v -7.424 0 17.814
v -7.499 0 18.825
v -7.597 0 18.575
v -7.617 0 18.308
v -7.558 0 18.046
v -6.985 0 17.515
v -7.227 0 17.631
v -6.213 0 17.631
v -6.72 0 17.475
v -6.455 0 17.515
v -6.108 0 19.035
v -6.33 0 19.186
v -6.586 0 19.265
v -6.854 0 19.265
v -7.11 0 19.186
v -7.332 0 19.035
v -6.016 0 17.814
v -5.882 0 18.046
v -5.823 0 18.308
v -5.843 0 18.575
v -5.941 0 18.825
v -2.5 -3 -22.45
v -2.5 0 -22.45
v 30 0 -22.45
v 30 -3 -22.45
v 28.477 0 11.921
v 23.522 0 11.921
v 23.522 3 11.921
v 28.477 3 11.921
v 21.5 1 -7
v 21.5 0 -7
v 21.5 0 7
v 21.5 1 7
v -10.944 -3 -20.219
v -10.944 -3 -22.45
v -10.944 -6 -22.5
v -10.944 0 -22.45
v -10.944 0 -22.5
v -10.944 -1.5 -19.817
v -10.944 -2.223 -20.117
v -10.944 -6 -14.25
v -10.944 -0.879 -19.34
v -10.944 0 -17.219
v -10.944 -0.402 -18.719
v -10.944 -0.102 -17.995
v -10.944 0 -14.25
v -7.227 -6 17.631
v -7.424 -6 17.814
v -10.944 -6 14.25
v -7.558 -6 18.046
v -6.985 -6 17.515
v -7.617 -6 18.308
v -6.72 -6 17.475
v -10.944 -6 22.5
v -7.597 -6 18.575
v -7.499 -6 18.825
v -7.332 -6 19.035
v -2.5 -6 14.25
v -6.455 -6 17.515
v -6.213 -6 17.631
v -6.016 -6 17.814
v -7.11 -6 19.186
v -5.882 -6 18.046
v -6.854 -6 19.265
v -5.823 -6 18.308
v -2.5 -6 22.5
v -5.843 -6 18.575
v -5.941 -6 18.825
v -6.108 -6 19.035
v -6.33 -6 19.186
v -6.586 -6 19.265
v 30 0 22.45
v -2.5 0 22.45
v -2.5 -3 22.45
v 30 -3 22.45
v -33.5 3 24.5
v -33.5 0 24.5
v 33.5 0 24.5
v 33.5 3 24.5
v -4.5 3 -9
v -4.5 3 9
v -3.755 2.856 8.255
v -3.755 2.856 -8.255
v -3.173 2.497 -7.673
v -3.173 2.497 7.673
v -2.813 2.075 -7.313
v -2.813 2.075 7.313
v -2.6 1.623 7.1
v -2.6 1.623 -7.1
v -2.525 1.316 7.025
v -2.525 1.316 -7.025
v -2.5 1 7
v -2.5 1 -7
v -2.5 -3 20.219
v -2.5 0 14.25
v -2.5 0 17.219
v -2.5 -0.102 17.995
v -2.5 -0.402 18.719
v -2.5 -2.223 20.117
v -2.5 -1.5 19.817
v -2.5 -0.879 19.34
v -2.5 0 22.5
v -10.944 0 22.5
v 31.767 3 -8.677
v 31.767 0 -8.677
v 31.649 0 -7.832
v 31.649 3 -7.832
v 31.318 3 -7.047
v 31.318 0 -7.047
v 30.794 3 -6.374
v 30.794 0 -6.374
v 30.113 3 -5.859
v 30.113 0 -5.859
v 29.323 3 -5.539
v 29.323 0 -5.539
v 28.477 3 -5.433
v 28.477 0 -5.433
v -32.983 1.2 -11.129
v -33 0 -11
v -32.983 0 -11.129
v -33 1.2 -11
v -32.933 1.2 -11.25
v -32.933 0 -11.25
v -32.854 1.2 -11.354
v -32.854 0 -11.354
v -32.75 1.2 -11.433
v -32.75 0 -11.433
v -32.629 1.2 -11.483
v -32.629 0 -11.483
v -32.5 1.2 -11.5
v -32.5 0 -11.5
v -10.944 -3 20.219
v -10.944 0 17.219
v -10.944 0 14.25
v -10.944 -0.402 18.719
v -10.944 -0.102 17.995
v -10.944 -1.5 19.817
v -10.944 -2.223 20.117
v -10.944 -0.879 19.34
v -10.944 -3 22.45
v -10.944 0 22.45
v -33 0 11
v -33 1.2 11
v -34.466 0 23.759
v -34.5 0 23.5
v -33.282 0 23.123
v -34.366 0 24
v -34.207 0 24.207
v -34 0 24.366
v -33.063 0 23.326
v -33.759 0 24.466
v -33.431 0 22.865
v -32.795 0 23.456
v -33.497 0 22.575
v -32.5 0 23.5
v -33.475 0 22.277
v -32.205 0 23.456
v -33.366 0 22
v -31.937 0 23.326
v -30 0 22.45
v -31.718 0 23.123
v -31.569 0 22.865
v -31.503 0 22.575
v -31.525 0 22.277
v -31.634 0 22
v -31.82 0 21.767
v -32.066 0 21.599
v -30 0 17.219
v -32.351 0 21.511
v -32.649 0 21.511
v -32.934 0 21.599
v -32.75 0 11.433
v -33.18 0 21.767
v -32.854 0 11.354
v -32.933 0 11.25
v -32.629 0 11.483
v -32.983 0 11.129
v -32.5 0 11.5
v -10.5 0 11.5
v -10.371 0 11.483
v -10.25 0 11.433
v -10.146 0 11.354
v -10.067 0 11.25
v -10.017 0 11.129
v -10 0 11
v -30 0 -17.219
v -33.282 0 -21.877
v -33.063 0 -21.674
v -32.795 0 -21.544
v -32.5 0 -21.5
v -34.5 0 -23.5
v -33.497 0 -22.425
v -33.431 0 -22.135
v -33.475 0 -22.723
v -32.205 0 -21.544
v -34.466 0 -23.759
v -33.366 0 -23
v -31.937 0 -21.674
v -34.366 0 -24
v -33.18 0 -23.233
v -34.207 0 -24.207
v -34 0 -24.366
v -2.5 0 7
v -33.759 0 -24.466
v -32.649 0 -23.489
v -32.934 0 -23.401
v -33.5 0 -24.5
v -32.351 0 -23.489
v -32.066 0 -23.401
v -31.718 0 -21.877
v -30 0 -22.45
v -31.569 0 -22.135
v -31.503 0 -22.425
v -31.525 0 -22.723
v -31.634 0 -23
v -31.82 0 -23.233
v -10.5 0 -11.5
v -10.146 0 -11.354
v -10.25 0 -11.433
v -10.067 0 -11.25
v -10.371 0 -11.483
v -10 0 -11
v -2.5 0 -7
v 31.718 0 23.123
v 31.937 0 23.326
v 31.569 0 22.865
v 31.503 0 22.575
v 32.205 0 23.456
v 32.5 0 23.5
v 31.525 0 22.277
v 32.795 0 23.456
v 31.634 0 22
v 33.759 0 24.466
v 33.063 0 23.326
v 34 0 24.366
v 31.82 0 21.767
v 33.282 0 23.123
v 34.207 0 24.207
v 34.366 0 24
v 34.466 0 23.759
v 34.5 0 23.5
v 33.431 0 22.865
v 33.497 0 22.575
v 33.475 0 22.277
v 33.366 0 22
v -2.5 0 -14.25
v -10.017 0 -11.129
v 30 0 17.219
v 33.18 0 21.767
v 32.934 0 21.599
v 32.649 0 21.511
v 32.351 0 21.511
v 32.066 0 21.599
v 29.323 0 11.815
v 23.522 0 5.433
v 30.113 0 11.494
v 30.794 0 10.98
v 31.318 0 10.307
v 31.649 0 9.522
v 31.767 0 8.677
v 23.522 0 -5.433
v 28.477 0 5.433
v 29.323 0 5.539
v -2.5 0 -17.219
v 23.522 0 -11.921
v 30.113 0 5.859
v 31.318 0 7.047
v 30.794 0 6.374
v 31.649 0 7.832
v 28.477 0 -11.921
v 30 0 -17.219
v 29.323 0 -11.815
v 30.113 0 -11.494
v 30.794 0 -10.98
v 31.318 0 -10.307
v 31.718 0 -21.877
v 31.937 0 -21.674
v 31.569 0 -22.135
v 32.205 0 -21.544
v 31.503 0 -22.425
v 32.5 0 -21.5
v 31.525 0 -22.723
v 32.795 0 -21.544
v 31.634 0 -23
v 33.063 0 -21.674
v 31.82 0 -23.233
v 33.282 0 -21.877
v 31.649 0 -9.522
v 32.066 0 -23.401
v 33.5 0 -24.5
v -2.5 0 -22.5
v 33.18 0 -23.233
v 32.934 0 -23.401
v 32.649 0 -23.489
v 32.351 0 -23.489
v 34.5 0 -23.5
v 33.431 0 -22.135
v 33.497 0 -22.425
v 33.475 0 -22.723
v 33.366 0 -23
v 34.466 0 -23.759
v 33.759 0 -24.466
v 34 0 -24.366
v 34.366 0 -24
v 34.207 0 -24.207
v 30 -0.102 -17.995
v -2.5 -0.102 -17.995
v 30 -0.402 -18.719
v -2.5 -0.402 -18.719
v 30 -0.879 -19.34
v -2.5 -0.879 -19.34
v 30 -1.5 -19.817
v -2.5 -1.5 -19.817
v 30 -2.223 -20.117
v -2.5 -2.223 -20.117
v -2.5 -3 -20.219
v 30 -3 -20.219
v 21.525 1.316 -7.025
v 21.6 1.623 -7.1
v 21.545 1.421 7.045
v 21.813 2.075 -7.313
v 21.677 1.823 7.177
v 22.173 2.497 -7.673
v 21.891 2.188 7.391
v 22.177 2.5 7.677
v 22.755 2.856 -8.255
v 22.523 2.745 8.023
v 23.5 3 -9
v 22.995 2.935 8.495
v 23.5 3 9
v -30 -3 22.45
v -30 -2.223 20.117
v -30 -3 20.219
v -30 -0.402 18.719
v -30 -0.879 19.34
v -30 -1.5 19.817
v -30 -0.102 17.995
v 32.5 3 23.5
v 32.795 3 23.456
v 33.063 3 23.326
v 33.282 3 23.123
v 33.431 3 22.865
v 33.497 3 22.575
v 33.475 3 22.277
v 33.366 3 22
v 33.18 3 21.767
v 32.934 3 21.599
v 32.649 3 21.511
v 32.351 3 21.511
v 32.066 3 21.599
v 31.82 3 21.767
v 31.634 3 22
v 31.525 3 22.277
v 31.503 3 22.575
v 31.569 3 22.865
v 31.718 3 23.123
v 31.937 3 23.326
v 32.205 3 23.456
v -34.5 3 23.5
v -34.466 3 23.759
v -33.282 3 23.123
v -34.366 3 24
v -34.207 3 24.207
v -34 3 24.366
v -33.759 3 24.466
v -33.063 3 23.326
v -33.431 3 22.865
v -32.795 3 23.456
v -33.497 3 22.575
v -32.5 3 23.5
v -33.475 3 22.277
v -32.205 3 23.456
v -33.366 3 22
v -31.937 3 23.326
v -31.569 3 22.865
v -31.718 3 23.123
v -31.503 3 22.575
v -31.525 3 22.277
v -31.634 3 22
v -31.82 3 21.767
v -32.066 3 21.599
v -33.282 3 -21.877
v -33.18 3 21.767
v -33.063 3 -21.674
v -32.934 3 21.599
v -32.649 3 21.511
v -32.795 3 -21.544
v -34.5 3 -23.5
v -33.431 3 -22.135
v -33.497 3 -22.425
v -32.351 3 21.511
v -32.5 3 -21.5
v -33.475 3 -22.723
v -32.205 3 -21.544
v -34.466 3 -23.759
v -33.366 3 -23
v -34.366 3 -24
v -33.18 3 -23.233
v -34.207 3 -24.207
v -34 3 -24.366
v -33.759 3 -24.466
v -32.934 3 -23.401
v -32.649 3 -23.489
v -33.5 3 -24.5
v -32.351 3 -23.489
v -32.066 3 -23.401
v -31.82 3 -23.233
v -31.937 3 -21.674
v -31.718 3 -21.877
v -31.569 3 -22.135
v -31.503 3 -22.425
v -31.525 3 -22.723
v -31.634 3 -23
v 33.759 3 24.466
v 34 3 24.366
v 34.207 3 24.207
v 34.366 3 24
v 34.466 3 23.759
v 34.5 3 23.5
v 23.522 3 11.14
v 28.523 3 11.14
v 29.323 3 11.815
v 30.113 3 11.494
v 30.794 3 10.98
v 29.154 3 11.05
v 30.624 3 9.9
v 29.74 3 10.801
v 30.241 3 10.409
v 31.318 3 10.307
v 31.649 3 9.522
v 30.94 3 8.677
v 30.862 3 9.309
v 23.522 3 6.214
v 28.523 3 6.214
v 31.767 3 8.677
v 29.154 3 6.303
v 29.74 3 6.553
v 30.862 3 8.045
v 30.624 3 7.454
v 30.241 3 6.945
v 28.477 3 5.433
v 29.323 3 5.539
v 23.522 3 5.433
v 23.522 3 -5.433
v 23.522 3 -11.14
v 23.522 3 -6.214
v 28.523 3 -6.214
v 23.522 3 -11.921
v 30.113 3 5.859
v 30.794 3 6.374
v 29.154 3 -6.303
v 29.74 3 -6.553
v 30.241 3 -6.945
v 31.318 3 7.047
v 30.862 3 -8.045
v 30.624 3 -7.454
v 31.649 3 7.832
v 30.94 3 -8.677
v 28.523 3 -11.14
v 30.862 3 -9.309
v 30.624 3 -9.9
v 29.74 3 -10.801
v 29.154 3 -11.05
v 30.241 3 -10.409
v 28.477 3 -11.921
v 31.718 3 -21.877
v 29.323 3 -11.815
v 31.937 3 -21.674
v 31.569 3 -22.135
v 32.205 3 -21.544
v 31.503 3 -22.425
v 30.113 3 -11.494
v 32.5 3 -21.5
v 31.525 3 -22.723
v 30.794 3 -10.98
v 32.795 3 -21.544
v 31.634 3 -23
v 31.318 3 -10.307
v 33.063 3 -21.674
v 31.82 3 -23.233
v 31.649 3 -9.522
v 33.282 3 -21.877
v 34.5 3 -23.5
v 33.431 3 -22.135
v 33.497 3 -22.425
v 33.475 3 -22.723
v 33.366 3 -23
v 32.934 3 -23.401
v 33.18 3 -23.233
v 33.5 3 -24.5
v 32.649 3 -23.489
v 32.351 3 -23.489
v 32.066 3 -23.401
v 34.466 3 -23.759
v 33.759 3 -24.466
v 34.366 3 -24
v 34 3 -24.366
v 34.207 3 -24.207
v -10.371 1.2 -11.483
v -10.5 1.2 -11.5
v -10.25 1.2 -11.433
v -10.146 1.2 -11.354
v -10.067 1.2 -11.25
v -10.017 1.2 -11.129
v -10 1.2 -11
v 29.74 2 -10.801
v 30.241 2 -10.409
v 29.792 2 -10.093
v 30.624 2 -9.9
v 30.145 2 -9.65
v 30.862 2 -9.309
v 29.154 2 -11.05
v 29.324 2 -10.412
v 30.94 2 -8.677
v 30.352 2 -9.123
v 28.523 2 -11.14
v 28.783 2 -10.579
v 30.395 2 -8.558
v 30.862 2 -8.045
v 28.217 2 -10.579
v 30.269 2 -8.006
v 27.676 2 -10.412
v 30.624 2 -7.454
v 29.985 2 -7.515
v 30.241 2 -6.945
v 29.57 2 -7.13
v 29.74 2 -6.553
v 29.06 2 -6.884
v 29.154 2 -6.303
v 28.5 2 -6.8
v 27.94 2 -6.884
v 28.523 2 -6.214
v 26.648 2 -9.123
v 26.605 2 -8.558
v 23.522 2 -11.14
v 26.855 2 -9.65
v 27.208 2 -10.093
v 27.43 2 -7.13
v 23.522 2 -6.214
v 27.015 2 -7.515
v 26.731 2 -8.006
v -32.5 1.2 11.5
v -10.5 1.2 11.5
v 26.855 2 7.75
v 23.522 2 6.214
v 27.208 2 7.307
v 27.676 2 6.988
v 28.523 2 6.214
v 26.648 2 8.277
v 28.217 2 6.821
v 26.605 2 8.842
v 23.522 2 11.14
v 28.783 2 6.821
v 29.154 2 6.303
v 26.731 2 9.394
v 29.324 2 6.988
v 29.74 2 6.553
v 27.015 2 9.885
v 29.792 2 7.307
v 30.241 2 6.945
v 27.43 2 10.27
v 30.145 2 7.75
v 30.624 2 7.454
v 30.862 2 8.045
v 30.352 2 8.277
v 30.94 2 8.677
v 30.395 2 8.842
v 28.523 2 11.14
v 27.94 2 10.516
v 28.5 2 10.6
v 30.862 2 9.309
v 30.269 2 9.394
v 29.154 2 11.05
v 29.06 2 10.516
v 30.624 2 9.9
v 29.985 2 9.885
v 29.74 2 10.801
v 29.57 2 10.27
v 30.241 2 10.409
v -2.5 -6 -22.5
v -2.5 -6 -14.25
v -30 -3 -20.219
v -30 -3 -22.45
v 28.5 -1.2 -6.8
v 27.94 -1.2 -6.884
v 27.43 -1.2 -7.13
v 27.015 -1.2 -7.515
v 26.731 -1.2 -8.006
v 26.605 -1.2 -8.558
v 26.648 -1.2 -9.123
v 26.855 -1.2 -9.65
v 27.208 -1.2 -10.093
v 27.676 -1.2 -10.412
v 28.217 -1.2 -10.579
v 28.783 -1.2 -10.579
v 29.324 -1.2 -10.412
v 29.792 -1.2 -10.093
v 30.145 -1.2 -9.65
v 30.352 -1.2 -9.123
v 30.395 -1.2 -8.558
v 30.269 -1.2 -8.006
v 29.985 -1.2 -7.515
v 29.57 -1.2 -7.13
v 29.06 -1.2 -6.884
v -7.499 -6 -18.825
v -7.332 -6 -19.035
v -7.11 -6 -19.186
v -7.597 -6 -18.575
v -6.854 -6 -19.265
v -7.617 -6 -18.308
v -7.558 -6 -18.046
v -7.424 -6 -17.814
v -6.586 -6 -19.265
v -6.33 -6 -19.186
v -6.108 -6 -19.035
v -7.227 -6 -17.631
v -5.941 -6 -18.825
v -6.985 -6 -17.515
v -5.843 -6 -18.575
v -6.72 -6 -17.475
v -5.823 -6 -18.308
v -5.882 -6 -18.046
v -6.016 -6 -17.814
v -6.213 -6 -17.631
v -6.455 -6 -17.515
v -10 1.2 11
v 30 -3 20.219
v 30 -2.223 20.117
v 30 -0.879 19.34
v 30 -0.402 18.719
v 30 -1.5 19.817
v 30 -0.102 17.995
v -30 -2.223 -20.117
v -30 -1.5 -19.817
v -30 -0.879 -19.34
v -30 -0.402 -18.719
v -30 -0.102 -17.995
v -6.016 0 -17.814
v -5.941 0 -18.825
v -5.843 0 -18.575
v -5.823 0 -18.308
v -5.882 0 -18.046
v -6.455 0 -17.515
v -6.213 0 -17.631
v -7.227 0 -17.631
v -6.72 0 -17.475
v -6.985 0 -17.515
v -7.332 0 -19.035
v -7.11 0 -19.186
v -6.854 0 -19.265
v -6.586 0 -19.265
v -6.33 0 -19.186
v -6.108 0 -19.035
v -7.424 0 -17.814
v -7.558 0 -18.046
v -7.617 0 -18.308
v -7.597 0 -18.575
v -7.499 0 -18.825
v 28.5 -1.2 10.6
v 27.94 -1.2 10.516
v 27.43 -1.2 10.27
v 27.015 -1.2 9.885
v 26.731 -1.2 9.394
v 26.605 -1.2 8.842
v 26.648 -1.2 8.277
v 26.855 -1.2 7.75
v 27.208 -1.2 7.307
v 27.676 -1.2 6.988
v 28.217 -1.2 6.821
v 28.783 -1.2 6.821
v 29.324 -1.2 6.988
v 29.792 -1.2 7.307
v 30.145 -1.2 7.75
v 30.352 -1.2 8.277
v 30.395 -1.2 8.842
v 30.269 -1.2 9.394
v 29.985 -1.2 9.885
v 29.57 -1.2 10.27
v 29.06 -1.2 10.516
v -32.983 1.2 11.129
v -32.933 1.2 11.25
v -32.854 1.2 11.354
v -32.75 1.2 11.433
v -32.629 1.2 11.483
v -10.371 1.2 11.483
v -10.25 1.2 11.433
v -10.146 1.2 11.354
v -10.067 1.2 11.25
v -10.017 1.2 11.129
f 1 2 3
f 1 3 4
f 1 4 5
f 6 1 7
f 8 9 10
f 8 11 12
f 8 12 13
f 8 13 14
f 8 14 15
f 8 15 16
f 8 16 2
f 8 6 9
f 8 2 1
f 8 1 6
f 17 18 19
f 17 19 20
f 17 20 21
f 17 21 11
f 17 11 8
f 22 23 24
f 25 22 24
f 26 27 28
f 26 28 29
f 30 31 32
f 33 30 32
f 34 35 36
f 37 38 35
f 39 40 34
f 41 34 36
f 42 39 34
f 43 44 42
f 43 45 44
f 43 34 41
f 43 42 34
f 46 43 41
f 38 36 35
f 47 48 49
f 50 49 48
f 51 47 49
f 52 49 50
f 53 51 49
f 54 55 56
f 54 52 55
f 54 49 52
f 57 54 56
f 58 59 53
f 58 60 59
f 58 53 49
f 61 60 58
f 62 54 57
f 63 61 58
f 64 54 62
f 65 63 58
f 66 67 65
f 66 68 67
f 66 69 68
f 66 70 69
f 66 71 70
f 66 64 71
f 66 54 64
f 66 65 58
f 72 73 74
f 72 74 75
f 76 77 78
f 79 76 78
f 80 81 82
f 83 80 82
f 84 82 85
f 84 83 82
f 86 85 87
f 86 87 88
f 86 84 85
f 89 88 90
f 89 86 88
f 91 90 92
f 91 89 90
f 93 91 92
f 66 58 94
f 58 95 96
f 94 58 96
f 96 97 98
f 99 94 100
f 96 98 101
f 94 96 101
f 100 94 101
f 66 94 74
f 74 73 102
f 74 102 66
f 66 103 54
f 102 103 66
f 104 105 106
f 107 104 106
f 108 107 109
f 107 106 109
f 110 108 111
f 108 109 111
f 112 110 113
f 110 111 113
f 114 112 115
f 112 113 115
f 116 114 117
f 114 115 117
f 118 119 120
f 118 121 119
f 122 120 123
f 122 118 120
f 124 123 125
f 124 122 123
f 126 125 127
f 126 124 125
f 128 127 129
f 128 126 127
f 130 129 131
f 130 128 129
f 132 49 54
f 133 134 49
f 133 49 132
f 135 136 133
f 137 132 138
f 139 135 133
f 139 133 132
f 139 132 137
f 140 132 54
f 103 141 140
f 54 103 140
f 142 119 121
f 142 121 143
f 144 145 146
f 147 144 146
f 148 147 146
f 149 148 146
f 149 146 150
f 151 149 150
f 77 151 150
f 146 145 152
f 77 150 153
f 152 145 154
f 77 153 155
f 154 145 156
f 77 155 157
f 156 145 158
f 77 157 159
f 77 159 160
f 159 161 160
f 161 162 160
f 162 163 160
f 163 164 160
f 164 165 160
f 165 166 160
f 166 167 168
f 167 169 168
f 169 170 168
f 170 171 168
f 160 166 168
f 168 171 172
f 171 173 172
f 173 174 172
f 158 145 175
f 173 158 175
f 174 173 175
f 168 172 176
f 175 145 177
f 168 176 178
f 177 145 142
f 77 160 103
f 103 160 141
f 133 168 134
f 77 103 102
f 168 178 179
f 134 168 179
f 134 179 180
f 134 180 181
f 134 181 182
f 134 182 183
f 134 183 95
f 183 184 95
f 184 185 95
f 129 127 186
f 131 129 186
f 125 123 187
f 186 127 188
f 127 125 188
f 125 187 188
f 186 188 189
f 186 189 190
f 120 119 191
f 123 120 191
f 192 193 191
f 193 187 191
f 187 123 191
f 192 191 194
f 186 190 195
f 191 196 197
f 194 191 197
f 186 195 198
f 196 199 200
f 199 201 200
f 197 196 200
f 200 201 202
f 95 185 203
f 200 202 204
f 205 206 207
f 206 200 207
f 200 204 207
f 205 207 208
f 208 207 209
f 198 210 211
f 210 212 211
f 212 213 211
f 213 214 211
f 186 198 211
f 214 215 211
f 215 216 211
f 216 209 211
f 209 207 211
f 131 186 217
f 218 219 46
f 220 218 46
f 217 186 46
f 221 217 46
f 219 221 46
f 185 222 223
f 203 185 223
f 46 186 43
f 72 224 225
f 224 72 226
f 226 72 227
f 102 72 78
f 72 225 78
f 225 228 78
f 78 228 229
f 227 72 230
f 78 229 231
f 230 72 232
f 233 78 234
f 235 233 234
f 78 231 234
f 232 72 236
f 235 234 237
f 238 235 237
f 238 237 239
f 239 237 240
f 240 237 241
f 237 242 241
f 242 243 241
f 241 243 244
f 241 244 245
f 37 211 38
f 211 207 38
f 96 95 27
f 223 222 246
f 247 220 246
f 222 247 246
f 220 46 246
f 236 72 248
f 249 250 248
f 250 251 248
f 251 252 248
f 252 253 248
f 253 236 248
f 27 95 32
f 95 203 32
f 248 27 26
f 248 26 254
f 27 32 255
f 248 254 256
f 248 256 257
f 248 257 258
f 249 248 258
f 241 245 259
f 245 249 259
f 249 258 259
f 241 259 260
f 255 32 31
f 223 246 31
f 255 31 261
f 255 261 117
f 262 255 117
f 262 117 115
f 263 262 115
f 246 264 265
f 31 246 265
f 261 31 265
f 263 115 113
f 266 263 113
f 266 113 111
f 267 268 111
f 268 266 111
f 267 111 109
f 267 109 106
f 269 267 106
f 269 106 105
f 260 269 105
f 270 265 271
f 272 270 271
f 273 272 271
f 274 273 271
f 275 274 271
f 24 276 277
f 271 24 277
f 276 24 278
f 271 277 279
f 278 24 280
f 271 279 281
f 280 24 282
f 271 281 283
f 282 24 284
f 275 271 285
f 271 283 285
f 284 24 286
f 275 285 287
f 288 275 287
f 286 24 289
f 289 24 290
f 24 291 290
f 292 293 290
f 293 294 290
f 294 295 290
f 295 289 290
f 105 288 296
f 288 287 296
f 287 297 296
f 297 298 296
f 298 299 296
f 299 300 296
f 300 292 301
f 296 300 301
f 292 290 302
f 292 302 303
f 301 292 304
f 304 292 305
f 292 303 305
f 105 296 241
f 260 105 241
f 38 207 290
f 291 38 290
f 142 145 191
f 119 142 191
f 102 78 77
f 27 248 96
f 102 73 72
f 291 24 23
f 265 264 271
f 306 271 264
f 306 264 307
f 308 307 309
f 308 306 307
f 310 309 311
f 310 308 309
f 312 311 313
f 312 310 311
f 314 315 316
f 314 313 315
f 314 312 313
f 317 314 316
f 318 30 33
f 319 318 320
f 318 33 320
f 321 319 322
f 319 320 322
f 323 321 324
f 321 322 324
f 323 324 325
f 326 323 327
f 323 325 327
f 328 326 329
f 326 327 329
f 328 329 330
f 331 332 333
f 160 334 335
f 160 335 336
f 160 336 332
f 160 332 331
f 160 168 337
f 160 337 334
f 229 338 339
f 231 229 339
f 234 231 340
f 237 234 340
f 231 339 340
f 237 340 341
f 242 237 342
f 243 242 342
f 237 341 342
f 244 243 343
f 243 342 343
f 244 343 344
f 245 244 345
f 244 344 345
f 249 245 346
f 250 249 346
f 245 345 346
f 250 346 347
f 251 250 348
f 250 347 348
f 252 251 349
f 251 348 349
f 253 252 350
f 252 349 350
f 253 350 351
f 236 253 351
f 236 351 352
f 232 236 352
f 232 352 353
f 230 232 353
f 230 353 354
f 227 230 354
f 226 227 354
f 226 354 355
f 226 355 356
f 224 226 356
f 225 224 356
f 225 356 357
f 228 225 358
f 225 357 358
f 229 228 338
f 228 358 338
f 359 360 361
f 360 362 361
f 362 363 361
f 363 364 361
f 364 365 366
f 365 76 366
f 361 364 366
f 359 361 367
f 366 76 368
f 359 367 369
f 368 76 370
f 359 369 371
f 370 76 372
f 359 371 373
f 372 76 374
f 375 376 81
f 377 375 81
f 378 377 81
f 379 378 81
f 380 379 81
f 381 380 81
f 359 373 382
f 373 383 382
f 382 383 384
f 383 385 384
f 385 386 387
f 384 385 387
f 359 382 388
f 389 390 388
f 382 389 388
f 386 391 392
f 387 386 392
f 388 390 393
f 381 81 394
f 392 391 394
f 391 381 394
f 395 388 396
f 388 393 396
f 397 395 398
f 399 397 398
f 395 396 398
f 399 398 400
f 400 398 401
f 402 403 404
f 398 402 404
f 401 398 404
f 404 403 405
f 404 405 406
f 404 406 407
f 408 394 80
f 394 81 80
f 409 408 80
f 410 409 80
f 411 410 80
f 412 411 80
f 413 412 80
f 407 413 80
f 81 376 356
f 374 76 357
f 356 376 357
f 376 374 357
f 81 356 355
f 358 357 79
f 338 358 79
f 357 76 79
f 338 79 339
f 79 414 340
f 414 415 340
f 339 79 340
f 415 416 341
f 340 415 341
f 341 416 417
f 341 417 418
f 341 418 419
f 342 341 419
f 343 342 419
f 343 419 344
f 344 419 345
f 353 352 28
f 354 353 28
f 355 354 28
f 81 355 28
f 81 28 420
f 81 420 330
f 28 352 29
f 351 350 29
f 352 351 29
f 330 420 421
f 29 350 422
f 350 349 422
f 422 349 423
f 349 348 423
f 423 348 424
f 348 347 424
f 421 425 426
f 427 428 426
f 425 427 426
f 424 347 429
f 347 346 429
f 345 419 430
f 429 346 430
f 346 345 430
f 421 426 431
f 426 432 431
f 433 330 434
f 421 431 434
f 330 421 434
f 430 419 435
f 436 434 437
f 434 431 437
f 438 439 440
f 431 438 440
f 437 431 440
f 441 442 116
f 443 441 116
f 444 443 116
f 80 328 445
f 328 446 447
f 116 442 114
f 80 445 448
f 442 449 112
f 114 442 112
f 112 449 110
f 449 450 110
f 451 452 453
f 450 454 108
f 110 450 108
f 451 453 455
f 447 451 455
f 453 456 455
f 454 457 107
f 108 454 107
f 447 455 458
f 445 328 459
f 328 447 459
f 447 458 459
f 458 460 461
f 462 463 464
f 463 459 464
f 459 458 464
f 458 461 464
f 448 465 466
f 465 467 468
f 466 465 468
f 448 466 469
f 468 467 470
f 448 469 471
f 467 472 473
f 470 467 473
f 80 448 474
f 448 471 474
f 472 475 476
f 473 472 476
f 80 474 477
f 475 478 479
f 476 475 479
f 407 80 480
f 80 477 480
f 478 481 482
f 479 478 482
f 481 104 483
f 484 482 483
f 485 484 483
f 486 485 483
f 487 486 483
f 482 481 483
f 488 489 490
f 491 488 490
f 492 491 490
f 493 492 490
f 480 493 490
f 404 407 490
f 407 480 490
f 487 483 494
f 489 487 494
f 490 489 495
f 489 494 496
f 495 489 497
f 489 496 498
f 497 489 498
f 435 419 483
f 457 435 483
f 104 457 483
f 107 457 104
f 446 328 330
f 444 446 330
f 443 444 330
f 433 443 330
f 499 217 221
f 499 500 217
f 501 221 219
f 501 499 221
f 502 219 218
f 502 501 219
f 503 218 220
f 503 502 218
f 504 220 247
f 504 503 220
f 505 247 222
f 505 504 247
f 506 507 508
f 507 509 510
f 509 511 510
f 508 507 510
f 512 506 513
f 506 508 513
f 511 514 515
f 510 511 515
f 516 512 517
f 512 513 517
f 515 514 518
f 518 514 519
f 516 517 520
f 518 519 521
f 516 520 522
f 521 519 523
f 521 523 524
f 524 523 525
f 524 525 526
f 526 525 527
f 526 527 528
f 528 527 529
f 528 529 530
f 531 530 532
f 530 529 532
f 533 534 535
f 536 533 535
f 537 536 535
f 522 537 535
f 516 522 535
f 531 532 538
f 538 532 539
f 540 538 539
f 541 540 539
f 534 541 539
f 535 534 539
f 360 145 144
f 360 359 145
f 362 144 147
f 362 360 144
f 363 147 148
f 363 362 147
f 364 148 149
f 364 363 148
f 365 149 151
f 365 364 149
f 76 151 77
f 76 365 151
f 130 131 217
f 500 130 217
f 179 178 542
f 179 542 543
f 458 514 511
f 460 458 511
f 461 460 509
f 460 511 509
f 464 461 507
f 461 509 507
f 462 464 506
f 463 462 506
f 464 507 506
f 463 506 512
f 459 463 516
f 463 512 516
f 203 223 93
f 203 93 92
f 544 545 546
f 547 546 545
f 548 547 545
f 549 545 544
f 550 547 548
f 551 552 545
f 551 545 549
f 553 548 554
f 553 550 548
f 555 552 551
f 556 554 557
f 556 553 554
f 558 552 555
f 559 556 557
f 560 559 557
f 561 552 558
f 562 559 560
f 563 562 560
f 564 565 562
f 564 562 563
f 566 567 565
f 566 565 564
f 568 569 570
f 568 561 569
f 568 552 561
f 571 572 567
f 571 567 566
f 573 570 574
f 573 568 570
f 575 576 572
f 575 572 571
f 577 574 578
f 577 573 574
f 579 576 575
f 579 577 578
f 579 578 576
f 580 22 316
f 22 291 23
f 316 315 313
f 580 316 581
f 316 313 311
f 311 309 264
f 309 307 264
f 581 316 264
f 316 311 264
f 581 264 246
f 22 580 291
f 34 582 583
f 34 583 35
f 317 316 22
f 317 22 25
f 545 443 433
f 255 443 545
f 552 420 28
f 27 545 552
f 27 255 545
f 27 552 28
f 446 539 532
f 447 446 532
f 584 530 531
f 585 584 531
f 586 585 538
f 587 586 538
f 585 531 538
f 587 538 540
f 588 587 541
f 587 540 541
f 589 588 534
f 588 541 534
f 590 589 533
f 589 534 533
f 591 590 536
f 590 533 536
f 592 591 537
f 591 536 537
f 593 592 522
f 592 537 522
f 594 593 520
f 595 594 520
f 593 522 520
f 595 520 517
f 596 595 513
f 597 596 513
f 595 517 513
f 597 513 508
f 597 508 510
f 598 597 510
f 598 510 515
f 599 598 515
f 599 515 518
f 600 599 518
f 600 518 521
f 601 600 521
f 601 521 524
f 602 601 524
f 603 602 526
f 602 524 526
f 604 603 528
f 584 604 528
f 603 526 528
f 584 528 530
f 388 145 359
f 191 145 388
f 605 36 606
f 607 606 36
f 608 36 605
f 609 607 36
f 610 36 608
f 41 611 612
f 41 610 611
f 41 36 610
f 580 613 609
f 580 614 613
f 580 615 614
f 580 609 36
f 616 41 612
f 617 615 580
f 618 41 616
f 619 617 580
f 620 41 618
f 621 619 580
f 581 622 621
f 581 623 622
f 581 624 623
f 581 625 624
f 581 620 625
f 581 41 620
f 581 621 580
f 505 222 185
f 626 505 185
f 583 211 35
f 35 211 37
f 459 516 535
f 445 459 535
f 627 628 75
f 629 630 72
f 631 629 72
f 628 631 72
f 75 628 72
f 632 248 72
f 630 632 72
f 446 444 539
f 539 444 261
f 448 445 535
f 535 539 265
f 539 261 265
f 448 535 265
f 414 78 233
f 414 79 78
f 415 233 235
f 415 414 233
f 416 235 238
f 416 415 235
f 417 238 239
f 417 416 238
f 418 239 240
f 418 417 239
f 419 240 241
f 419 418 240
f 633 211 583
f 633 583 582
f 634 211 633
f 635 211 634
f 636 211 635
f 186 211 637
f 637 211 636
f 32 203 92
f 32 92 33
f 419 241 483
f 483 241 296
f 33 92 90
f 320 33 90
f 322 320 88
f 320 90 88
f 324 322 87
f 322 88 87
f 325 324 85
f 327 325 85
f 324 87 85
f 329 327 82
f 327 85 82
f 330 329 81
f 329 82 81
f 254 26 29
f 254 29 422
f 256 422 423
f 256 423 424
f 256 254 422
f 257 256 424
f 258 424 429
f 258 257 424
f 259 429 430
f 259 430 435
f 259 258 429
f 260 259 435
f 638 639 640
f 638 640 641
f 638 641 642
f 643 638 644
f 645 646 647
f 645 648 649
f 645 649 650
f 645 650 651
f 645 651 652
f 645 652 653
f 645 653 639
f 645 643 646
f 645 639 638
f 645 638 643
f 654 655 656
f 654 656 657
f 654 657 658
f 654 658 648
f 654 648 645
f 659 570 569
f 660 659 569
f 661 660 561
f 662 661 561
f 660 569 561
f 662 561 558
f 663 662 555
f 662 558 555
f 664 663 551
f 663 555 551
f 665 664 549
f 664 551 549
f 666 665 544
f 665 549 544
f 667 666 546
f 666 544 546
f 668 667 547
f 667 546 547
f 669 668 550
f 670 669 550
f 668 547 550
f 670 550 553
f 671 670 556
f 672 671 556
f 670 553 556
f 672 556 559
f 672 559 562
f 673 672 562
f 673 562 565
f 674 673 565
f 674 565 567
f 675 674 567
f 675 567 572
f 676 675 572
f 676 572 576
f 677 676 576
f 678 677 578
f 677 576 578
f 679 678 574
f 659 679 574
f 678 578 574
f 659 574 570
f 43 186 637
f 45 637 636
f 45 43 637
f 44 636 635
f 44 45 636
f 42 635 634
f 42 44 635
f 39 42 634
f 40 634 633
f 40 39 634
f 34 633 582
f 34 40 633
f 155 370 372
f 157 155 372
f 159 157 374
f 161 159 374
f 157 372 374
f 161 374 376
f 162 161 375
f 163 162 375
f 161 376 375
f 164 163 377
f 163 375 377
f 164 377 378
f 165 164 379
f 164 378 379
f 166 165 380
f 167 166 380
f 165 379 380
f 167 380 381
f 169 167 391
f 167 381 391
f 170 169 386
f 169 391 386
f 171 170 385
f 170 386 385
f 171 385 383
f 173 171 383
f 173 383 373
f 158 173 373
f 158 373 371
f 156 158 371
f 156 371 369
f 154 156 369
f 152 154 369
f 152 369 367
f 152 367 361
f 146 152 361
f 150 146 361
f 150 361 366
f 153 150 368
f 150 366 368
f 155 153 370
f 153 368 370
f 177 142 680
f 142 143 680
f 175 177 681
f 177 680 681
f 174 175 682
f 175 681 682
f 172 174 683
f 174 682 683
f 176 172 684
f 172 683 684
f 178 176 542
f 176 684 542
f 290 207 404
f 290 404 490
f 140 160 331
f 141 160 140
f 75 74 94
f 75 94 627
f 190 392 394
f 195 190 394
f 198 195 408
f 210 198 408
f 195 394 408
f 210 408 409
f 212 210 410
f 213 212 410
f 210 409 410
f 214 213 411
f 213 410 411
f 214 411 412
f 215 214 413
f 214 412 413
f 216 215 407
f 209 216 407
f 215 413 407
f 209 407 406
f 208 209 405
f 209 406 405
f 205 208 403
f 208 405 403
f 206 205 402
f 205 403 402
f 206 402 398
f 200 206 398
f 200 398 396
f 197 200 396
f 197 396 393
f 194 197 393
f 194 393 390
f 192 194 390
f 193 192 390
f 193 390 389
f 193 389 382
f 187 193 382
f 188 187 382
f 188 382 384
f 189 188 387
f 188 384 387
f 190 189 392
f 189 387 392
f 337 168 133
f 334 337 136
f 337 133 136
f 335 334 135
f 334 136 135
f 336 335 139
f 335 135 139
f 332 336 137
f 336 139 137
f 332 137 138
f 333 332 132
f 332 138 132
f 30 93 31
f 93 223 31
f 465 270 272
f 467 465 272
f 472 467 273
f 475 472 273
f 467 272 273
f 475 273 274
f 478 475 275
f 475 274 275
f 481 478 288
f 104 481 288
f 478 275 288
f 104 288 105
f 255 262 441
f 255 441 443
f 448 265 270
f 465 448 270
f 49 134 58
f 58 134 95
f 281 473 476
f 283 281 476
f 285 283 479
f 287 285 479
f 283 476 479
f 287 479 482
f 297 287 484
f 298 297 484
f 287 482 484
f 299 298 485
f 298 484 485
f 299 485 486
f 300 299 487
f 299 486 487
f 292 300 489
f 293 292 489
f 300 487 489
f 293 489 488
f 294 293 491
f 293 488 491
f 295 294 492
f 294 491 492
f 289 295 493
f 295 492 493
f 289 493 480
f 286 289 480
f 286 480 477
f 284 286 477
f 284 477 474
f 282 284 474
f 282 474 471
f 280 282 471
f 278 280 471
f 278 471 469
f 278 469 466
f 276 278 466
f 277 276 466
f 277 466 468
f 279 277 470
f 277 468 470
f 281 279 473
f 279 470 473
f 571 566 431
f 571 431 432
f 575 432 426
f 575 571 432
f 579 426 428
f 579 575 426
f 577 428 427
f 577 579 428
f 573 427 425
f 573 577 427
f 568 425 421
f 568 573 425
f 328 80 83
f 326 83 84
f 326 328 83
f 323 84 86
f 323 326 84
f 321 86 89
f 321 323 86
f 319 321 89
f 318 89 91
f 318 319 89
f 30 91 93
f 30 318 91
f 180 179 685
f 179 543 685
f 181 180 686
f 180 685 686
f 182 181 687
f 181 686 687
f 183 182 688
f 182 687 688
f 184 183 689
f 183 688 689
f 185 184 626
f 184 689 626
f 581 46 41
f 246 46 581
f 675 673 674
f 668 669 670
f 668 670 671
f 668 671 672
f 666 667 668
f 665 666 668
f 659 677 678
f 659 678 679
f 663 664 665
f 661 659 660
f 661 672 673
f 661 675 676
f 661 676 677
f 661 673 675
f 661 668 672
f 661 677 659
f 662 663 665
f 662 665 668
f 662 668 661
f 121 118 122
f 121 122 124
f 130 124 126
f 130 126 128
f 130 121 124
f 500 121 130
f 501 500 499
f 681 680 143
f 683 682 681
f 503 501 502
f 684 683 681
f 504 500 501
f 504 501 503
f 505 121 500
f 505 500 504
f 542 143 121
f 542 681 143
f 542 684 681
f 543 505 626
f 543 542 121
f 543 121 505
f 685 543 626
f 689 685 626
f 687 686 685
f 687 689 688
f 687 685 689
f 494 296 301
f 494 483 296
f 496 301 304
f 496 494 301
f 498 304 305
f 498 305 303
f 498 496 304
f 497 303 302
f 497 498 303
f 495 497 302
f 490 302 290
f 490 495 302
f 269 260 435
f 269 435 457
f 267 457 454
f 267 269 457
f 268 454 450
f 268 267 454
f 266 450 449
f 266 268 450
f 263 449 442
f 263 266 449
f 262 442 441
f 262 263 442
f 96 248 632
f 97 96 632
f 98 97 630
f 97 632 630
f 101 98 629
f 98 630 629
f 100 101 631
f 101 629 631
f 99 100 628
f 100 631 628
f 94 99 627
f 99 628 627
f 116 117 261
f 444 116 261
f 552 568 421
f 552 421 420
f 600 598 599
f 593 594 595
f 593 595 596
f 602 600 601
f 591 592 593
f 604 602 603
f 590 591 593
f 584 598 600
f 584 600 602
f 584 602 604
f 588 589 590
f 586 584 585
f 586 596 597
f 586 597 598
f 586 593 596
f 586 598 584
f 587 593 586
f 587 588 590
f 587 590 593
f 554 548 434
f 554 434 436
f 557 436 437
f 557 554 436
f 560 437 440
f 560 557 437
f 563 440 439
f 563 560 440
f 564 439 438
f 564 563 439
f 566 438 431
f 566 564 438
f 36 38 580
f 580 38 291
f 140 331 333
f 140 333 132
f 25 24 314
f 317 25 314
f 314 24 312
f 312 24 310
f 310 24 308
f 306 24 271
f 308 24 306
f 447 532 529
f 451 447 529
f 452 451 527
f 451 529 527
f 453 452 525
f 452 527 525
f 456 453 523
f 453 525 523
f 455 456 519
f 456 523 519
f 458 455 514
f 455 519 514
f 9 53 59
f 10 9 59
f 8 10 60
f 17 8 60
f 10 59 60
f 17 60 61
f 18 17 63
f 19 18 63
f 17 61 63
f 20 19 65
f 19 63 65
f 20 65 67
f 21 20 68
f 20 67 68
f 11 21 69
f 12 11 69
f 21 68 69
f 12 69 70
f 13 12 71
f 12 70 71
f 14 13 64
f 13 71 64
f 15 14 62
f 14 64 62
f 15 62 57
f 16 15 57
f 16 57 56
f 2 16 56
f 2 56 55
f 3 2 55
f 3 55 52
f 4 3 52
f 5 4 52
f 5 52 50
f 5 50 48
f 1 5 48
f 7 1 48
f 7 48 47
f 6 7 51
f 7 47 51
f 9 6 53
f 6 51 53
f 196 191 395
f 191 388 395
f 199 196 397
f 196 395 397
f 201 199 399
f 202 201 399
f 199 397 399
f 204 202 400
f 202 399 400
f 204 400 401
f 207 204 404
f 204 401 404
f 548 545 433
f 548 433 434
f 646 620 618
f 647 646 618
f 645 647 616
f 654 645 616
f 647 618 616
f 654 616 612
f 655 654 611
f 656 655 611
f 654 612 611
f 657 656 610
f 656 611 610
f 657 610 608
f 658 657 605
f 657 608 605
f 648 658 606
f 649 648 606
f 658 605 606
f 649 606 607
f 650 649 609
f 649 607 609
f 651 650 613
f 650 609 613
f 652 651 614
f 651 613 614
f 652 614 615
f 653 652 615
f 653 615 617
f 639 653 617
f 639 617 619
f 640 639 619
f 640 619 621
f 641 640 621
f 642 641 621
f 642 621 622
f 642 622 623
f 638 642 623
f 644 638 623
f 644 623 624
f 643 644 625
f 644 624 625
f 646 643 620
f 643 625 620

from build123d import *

# Parameters (mm, degrees)
SCHIZZO1_W                        = 69
SCHIZZO1_H                        = 49
ESTRUSIONE_ESTRUSIONE1_DEPTH      = 3
RACCORDO1_R                       = 1
RACCORDO2_R                       = 1
RACCORDO3_R                       = 1
RACCORDO4_R                       = 1
SCHIZZO2_W                        = 60
SCHIZZO2_H                        = 2.231214474
ESTRUSIONE_ESTRUSIONE2_DEPTH      = 3
RACCORDO5_R                       = 3
RACCORDO6_R                       = 3
SCHIZZO3_R                        = 1
TAGLIO_ESTRUSIONE1_DEPTH          = 3
SCHIZZO4_W                        = 24
SCHIZZO4_H                        = 14
TAGLIO_ESTRUSIONE2_DEPTH          = 3
SCHIZZO5_W                        = 23
SCHIZZO5_H                        = 23
TAGLIO_ESTRUSIONE3_DEPTH          = 1.2
RACCORDO7_R                       = 0.5
RACCORDO8_R                       = 0.5
RACCORDO9_R                       = 0.5
RACCORDO10_R                      = 0.5
RACCORDO11_R                      = 2
RACCORDO12_R                      = 2
RACCORDO13_R                      = 2
RACCORDO14_R                      = 2
SCHIZZO6_W                        = 8.444052449
SCHIZZO6_H                        = 8.25
ESTRUSIONE_ESTRUSIONE3_DEPTH      = 6
SCHIZZO7_R                        = 0.9
TAGLIO_ESTRUSIONE4_DEPTH          = 6
ESTRUSIONE_ESTRUSIONE4_DEPTH      = 1.2
ESTRUSIONE_ESTRUSIONE4_DEPTH_BACK = 3
SCHIZZO8_R                        = 1.75
TAGLIO_ESTRUSIONE5_DEPTH          = 3
TAGLIO_ESTRUSIONE6_DEPTH          = 2
SCHIZZO13_R                       = 1.9
ESTRUSIONE_ESTRUSIONE5_DEPTH      = 3.2
SCHIZZO14_R                       = 1.9
ESTRUSIONE_ESTRUSIONE6_DEPTH      = 3.2


with BuildPart() as part:
    # Schizzo1 → Estrusione-Estrusione1 (new body)
    with BuildSketch(Plane(origin=(0, 0, 0), x_dir=(1, 0, 0), z_dir=(0, 1, 0))):
        Rectangle(SCHIZZO1_W, SCHIZZO1_H)
    extrude(amount=ESTRUSIONE_ESTRUSIONE1_DEPTH)

    # Raccordo1
    raccordo1_edges = [part.edges().sort_by_distance(p)[0] for p in [
        (-34.5, 1.5, 24.5),
    ]]
    fillet(raccordo1_edges, radius=RACCORDO1_R)

    # Raccordo2
    raccordo2_edges = [part.edges().sort_by_distance(p)[0] for p in [
        (-34.5, 1.5, -24.5),
    ]]
    fillet(raccordo2_edges, radius=RACCORDO2_R)

    # Raccordo3
    raccordo3_edges = [part.edges().sort_by_distance(p)[0] for p in [
        (34.5, 1.5, 24.5),
    ]]
    fillet(raccordo3_edges, radius=RACCORDO3_R)

    # Raccordo4
    raccordo4_edges = [part.edges().sort_by_distance(p)[0] for p in [
        (34.5, 1.5, -24.5),
    ]]
    fillet(raccordo4_edges, radius=RACCORDO4_R)

    # Schizzo2 → Estrusione-Estrusione2 (add)
    with BuildSketch(Plane.XZ):
        with Locations((0, 21.334392763)):
            Rectangle(SCHIZZO2_W, SCHIZZO2_H)
        with Locations((0, -21.334392763)):
            Rectangle(SCHIZZO2_W, SCHIZZO2_H)
    extrude(amount=ESTRUSIONE_ESTRUSIONE2_DEPTH)

    # Raccordo5
    raccordo5_edges = [part.edges().sort_by_distance(p)[0] for p in [
        (0, 0, 20.218785526),
    ]]
    fillet(raccordo5_edges, radius=RACCORDO5_R - 0.0001)  # a hair under: the kernel refuses the full size

    # Raccordo6
    raccordo6_edges = [part.edges().sort_by_distance(p)[0] for p in [
        (0, 0, -20.218785526),
    ]]
    fillet(raccordo6_edges, radius=RACCORDO6_R - 0.0001)  # a hair under: the kernel refuses the full size

    # Schizzo3 → Taglio-Estrusione1 (cut)
    with BuildSketch(Plane(origin=(0, 3, 0), x_dir=(1, 0, 0), z_dir=(0, 1, 0))):
        with Locations(Location((-32.5, 22.5, 0), (0, 0, 270))):
            Circle(SCHIZZO3_R)
        with Locations(Location((32.5, 22.5, 0), (0, 0, 270))):
            Circle(SCHIZZO3_R)
        with Locations(Location((32.5, -22.5, 0), (0, 0, 270))):
            Circle(SCHIZZO3_R)
        with Locations(Location((-32.5, -22.5, 0), (0, 0, 270))):
            Circle(SCHIZZO3_R)
    extrude(amount=-TAGLIO_ESTRUSIONE1_DEPTH, mode=Mode.SUBTRACT)

    # Schizzo4 → Taglio-Estrusione2 (cut)
    with BuildSketch(Plane.XZ):
        with Locations((9.5, 0)):
            Rectangle(SCHIZZO4_W, SCHIZZO4_H)
    extrude(amount=-TAGLIO_ESTRUSIONE2_DEPTH, mode=Mode.SUBTRACT)

    # Schizzo5 → Taglio-Estrusione3 (cut)
    with BuildSketch(Plane.XZ):
        with Locations((-21.5, 0)):
            Rectangle(SCHIZZO5_W, SCHIZZO5_H)
    extrude(amount=-TAGLIO_ESTRUSIONE3_DEPTH, mode=Mode.SUBTRACT)

    # Raccordo7
    raccordo7_edges = [part.edges().sort_by_distance(p)[0] for p in [
        (-33, 0.6, 11.5),
    ]]
    fillet(raccordo7_edges, radius=RACCORDO7_R)

    # Raccordo8
    raccordo8_edges = [part.edges().sort_by_distance(p)[0] for p in [
        (-10, 0.6, 11.5),
    ]]
    fillet(raccordo8_edges, radius=RACCORDO8_R)

    # Raccordo9
    raccordo9_edges = [part.edges().sort_by_distance(p)[0] for p in [
        (-33, 0.6, -11.5),
    ]]
    fillet(raccordo9_edges, radius=RACCORDO9_R)

    # Raccordo10
    raccordo10_edges = [part.edges().sort_by_distance(p)[0] for p in [
        (-10, 0.6, -11.5),
    ]]
    fillet(raccordo10_edges, radius=RACCORDO10_R)

    # Raccordo11
    raccordo11_edges = [part.edges().sort_by_distance(p)[0] for p in [
        (21.5, 3, 0),
    ]]
    fillet(raccordo11_edges, radius=RACCORDO11_R)

    # Raccordo12
    raccordo12_edges = [part.edges().sort_by_distance(p)[0] for p in [
        (10.5, 3, 7),
    ]]
    fillet(raccordo12_edges, radius=RACCORDO12_R)

    # Raccordo13
    raccordo13_edges = [part.edges().sort_by_distance(p)[0] for p in [
        (-2.5, 3, 1),
    ]]
    fillet(raccordo13_edges, radius=RACCORDO13_R)

    # Raccordo14
    raccordo14_edges = [part.edges().sort_by_distance(p)[0] for p in [
        (9.5, 3, -7),
    ]]
    fillet(raccordo14_edges, radius=RACCORDO14_R)

    # Schizzo6 → Estrusione-Estrusione3 (add)
    with BuildSketch(Plane.XZ):
        with Locations((-6.722026225, 18.375)):
            Rectangle(SCHIZZO6_W, SCHIZZO6_H)
        with Locations((-6.722026225, -18.375)):
            Rectangle(SCHIZZO6_W, SCHIZZO6_H)
    extrude(amount=ESTRUSIONE_ESTRUSIONE3_DEPTH)

    # Schizzo7 → Taglio-Estrusione4 (cut)
    with BuildSketch(Plane.XZ.offset(6)):
        with Locations(Location((-6.72, 18.375, 0), (0, 0, 270))):
            Circle(SCHIZZO7_R)
        with Locations(Location((-6.72, -18.375, 0), (0, 0, 90))):
            Circle(SCHIZZO7_R)
    extrude(amount=-TAGLIO_ESTRUSIONE4_DEPTH, mode=Mode.SUBTRACT)

    # Schizzo8 → Estrusione-Estrusione4 (add, two sides: drawn at the far end of the back side and taken through both)
    with BuildSketch(Plane.XZ.offset(-ESTRUSIONE_ESTRUSIONE4_DEPTH_BACK)):
        with Locations(Location((28.5, 8.7, 0), (0, 0, 270))):
            Circle(SCHIZZO8_R)
        with Locations(Location((28.5, -8.7, 0), (0, 0, 90))):
            Circle(SCHIZZO8_R)
    extrude(amount=ESTRUSIONE_ESTRUSIONE4_DEPTH + ESTRUSIONE_ESTRUSIONE4_DEPTH_BACK)

    # Schizzo9 → Taglio-Estrusione5 (cut)
    with BuildSketch(Plane.XZ):
        with BuildLine():
            Line((28.523054823, 11.139507375), (23.522221501, 11.139507375))
            Line((23.522221501, 11.139507375), (23.522221501, 11.920576973))
            Line((23.522221501, 11.920576973), (28.476945177, 11.920576973))
            ThreePointArc((28.476945177, 11.920576973), (30.793594038, 10.980088836), (31.766686618, 8.676945177))
            ThreePointArc((31.766686618, 8.676945177), (30.793594038, 6.373801519), (28.476945177, 5.433313382))
            Line((28.476945177, 5.433313382), (23.522221501, 5.433313382))
            Line((23.522221501, 5.433313382), (23.522221501, 6.21438298))
            Line((23.522221501, 6.21438298), (28.523054823, 6.21438298))
            ThreePointArc((28.523054823, 6.21438298), (30.241294429, 6.945200369), (30.939507375, 8.676945177))
            ThreePointArc((30.939507375, 8.676945177), (30.241294429, 10.408689986), (28.523054823, 11.139507375))
        make_face()
        with BuildLine():
            Line((23.522221501, -5.433313382), (23.522221501, -6.21438298))
            Line((23.522221501, -6.21438298), (28.523054823, -6.21438298))
            ThreePointArc((28.523054823, -6.21438298), (30.241294429, -6.945200369), (30.939507375, -8.676945177))
            ThreePointArc((30.939507375, -8.676945177), (30.241294429, -10.408689986), (28.523054823, -11.139507375))
            Line((28.523054823, -11.139507375), (23.522221501, -11.139507375))
            Line((23.522221501, -11.139507375), (23.522221501, -11.920576973))
            Line((23.522221501, -11.920576973), (28.476945177, -11.920576973))
            ThreePointArc((28.476945177, -11.920576973), (30.793594038, -10.980088836), (31.766686618, -8.676945177))
            ThreePointArc((31.766686618, -8.676945177), (30.793594038, -6.373801519), (28.476945177, -5.433313382))
            Line((28.476945177, -5.433313382), (23.522221501, -5.433313382))
        make_face()
    extrude(amount=-TAGLIO_ESTRUSIONE5_DEPTH, mode=Mode.SUBTRACT)

    # Schizzo11 → Taglio-Estrusione6 (cut)
    with BuildSketch(Plane.XZ):
        with BuildLine():
            Line((28.523054823, 11.139507375), (23.522221501, 11.139507375))
            Line((23.522221501, 11.139507375), (23.522221501, 6.21438298))
            Line((23.522221501, 6.21438298), (28.523054823, 6.21438298))
            ThreePointArc((28.523054823, 6.21438298), (30.248124061, 6.938498616), (30.939507375, 8.676945177))
            ThreePointArc((30.939507375, 8.676945177), (30.248124061, 10.415391738), (28.523054823, 11.139507375))
        make_face()
        with BuildLine():
            Line((23.522221501, -6.21438298), (28.523054823, -6.21438298))
            ThreePointArc((28.523054823, -6.21438298), (30.248124061, -6.938498616), (30.939507375, -8.676945177))
            ThreePointArc((30.939507375, -8.676945177), (30.248124061, -10.415391738), (28.523054823, -11.139507375))
            Line((28.523054823, -11.139507375), (23.522221501, -11.139507375))
            Line((23.522221501, -11.139507375), (23.522221501, -6.21438298))
        make_face()
    extrude(amount=-TAGLIO_ESTRUSIONE6_DEPTH, mode=Mode.SUBTRACT)


with BuildPart() as taglio_estrusione6_piece_1:
    # of the separate pieces the step leaves, piece 1, a body of its own (taglio_estrusione6_pieces)
    add(part.part.solids().sort_by_distance((34.5, 3, -23.5))[0])



with BuildPart() as taglio_estrusione6_piece_2:
    # of the separate pieces the step leaves, piece 2, a body of its own (taglio_estrusione6_pieces)
    add(part.part.solids().sort_by_distance((28.5, 0, 6.95))[0])


with BuildPart() as taglio_estrusione6_piece_3:
    # of the separate pieces the step leaves, piece 3, a body of its own (taglio_estrusione6_pieces)
    add(part.part.solids().sort_by_distance((28.5, 0, -6.95))[0])


with BuildPart() as taglio_estrusione6_piece_1_1:
    add(taglio_estrusione6_piece_1.part)

    add(taglio_estrusione6_piece_2.part)  # Estrusione-Estrusione5 merges Taglio-Estrusione6 piece 2
    # Schizzo13 → Estrusione-Estrusione5 (add)
    with BuildSketch(Plane.XZ.offset(-2)):
        with Locations(Location((28.5, 8.7, 0), (0, 0, 90))):
            Circle(SCHIZZO13_R)
    extrude(amount=ESTRUSIONE_ESTRUSIONE5_DEPTH)


    add(taglio_estrusione6_piece_3.part)  # Estrusione-Estrusione6 merges Taglio-Estrusione6 piece 3
    # Schizzo14 → Estrusione-Estrusione6 (add)
    with BuildSketch(Plane.XZ.offset(-2)):
        with Locations(Location((28.5, -8.7, 0), (0, 0, 90))):
            Circle(SCHIZZO14_R)
    extrude(amount=ESTRUSIONE_ESTRUSIONE6_DEPTH)


solid = taglio_estrusione6_piece_1_1.part
